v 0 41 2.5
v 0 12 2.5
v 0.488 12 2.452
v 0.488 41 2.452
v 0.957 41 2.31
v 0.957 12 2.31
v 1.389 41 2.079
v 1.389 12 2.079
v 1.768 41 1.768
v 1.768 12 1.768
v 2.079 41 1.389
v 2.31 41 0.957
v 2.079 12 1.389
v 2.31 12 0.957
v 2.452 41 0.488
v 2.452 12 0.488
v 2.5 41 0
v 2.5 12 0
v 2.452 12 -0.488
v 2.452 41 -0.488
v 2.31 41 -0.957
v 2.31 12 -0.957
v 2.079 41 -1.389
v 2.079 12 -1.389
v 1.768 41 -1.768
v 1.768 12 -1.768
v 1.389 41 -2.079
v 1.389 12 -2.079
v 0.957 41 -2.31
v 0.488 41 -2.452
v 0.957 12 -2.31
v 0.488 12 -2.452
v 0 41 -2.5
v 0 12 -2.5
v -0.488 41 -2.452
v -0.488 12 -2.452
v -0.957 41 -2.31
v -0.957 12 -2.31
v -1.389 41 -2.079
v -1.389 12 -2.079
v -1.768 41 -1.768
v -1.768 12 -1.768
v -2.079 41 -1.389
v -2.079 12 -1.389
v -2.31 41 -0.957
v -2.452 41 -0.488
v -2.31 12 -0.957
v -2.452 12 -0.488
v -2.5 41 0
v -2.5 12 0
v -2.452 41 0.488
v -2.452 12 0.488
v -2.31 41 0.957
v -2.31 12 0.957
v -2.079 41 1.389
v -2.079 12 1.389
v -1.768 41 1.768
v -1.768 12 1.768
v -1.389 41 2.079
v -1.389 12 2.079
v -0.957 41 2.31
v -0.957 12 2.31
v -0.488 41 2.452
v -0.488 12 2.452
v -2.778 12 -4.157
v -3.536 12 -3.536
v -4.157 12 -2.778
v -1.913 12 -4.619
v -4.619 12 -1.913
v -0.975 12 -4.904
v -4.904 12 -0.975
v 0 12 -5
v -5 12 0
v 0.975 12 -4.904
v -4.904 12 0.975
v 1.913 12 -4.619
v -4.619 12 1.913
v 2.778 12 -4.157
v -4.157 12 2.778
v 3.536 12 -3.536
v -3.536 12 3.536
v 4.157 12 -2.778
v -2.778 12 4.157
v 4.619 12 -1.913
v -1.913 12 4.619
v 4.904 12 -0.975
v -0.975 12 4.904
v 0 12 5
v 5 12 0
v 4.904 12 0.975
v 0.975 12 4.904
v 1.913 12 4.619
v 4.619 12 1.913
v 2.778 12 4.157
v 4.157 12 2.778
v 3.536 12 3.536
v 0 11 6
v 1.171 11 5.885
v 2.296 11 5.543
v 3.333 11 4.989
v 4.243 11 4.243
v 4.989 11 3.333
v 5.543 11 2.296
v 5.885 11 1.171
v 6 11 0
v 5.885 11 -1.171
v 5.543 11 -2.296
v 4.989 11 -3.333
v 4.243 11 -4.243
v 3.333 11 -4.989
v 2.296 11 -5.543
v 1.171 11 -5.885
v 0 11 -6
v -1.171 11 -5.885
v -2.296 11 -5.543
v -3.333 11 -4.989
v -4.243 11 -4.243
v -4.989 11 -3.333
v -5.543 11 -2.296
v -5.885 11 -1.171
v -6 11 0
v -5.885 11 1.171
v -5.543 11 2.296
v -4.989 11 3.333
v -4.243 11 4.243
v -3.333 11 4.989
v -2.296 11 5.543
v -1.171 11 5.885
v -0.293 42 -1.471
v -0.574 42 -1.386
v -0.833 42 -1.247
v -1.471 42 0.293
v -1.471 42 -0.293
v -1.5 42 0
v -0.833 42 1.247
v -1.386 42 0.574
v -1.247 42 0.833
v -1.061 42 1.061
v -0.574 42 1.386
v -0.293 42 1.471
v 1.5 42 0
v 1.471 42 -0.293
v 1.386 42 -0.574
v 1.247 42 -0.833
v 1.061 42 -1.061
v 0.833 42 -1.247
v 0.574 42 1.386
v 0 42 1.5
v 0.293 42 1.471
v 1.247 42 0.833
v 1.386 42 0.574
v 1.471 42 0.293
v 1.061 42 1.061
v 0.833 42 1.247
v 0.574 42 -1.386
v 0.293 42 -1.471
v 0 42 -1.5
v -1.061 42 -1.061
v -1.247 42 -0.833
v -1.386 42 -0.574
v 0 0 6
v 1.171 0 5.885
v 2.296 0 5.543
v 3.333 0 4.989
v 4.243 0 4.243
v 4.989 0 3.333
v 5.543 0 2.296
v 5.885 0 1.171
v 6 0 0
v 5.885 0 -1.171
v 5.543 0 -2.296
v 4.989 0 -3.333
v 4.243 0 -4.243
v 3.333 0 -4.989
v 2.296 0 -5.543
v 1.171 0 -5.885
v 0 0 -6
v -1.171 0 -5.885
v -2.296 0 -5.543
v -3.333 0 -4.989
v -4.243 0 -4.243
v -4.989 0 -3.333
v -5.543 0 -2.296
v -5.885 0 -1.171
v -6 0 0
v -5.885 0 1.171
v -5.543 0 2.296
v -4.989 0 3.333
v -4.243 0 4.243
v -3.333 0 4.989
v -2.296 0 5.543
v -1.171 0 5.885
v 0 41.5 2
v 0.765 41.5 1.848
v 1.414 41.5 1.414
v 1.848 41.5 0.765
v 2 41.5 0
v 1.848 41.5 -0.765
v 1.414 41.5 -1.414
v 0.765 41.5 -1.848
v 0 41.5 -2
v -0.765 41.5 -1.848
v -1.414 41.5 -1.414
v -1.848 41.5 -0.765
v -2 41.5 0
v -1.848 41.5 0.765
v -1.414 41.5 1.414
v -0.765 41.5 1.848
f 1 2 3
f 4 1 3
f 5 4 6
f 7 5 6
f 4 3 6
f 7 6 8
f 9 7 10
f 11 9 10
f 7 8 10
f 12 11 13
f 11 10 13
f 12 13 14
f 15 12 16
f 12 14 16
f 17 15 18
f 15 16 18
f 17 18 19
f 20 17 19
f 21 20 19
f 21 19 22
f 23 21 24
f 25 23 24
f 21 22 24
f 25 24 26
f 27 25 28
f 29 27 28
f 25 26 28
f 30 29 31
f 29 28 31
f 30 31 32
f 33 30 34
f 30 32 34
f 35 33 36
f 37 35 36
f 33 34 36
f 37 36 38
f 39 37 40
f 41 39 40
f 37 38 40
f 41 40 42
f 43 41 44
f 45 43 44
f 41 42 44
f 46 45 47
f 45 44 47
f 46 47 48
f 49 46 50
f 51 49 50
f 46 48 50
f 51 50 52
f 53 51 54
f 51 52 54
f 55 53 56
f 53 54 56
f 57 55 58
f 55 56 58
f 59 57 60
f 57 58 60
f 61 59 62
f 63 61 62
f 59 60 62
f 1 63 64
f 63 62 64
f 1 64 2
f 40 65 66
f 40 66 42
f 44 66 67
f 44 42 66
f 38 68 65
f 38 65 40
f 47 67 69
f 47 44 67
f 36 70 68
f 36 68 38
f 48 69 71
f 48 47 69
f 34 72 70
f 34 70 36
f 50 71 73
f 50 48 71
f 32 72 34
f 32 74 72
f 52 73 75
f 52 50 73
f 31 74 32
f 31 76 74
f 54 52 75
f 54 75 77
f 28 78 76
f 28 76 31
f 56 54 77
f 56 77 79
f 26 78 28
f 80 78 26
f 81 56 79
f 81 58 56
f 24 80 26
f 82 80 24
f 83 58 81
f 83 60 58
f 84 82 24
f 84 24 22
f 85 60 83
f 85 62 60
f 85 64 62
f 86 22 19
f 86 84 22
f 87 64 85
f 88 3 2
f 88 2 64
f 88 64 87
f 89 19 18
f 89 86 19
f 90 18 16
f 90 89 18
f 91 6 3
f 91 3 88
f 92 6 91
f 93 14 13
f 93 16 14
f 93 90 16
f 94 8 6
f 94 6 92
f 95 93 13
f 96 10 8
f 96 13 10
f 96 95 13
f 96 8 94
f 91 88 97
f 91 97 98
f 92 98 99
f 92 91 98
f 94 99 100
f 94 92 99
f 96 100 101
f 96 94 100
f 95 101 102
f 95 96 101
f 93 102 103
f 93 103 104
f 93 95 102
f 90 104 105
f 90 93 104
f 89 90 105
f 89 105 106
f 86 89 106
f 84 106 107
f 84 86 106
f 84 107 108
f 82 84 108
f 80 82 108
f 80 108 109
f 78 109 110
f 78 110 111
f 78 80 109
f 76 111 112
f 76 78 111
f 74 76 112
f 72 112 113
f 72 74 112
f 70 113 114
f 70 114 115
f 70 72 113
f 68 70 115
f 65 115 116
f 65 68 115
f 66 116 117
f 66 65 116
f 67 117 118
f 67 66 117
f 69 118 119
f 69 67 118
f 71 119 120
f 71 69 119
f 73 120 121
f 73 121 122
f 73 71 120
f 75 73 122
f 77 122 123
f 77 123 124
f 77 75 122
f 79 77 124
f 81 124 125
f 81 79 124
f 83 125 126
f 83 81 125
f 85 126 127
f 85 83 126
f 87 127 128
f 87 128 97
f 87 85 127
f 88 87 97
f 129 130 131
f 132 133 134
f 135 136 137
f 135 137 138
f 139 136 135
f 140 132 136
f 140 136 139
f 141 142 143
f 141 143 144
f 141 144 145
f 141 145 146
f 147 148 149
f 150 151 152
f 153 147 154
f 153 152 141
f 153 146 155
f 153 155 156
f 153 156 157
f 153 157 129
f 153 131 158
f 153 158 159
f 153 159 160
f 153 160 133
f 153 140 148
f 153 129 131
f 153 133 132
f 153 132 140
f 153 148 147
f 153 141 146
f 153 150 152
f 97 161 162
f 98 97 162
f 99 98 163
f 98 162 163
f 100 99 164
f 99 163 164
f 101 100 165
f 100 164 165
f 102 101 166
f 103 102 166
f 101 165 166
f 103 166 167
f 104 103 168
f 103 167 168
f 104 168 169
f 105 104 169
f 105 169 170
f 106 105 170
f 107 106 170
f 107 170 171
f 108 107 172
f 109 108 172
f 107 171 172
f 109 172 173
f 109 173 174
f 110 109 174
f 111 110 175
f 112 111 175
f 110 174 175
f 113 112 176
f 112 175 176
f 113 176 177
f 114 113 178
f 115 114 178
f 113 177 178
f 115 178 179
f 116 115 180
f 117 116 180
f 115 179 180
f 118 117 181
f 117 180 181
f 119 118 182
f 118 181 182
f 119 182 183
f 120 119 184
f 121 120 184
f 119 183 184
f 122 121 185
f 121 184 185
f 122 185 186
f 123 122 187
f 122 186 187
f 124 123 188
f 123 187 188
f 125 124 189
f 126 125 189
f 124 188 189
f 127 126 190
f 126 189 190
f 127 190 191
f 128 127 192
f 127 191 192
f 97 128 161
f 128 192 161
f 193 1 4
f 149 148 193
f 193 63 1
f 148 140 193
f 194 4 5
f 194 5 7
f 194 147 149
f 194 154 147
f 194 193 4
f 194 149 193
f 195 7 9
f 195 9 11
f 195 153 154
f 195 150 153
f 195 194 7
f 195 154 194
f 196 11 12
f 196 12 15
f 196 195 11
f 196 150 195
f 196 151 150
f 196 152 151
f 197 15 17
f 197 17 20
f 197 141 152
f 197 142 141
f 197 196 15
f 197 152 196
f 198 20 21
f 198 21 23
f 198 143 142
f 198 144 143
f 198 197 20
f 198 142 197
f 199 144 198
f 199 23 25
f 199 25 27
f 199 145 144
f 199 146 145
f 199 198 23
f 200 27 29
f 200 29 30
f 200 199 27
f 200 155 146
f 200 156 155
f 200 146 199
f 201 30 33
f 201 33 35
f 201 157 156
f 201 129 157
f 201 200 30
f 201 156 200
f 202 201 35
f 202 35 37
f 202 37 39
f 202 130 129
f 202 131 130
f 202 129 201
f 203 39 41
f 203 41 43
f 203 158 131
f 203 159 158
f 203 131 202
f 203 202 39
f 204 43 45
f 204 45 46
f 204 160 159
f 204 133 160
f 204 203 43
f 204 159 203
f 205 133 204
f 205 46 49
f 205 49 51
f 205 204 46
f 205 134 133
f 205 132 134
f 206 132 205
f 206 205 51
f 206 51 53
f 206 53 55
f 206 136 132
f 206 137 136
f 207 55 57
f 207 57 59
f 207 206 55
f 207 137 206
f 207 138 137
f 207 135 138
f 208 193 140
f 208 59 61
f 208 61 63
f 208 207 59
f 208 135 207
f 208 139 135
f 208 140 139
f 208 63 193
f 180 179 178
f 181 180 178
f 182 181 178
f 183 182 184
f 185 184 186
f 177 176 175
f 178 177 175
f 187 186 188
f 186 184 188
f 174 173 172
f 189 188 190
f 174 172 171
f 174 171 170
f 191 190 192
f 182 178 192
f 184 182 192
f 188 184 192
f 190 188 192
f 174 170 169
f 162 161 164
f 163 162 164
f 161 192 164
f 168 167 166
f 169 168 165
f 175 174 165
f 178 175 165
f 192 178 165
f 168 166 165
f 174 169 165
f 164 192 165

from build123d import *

# Parameters (mm, degrees)
SKETCH_1_R      = 6
EXTRUDE_1_DEPTH = 12
SKETCH_2_R      = 2.5
EXTRUDE_2_DEPTH = 30
CHAMFER_1_SIZE  = 1


with BuildPart() as part:
    # Эскиз1 → Вытянуть1 (new body)
    with BuildSketch(Plane(origin=(0, 0, 0), x_dir=(1, 0, 0), z_dir=(0, 1, 0))):
        with Locations(Location((0, 0, 0), (0, 0, 270))):
            Circle(SKETCH_1_R)
    extrude(amount=EXTRUDE_1_DEPTH)

    # Эскиз2 → Вытянуть2 (add)
    with BuildSketch(Plane(origin=(0, 12, 0), x_dir=(1, 0, 0), z_dir=(0, 1, 0))):
        with Locations(Location((0, 0, 0), (0, 0, 270))):
            Circle(SKETCH_2_R)
    extrude(amount=EXTRUDE_2_DEPTH)

    # Фаска1
    chamfer_1_edges = [part.edges().sort_by_distance(p)[0] for p in [
        (0, 12, -6),
        (0, 42, -2.5),
    ]]
    chamfer(chamfer_1_edges, length=CHAMFER_1_SIZE)


solid = part.part
